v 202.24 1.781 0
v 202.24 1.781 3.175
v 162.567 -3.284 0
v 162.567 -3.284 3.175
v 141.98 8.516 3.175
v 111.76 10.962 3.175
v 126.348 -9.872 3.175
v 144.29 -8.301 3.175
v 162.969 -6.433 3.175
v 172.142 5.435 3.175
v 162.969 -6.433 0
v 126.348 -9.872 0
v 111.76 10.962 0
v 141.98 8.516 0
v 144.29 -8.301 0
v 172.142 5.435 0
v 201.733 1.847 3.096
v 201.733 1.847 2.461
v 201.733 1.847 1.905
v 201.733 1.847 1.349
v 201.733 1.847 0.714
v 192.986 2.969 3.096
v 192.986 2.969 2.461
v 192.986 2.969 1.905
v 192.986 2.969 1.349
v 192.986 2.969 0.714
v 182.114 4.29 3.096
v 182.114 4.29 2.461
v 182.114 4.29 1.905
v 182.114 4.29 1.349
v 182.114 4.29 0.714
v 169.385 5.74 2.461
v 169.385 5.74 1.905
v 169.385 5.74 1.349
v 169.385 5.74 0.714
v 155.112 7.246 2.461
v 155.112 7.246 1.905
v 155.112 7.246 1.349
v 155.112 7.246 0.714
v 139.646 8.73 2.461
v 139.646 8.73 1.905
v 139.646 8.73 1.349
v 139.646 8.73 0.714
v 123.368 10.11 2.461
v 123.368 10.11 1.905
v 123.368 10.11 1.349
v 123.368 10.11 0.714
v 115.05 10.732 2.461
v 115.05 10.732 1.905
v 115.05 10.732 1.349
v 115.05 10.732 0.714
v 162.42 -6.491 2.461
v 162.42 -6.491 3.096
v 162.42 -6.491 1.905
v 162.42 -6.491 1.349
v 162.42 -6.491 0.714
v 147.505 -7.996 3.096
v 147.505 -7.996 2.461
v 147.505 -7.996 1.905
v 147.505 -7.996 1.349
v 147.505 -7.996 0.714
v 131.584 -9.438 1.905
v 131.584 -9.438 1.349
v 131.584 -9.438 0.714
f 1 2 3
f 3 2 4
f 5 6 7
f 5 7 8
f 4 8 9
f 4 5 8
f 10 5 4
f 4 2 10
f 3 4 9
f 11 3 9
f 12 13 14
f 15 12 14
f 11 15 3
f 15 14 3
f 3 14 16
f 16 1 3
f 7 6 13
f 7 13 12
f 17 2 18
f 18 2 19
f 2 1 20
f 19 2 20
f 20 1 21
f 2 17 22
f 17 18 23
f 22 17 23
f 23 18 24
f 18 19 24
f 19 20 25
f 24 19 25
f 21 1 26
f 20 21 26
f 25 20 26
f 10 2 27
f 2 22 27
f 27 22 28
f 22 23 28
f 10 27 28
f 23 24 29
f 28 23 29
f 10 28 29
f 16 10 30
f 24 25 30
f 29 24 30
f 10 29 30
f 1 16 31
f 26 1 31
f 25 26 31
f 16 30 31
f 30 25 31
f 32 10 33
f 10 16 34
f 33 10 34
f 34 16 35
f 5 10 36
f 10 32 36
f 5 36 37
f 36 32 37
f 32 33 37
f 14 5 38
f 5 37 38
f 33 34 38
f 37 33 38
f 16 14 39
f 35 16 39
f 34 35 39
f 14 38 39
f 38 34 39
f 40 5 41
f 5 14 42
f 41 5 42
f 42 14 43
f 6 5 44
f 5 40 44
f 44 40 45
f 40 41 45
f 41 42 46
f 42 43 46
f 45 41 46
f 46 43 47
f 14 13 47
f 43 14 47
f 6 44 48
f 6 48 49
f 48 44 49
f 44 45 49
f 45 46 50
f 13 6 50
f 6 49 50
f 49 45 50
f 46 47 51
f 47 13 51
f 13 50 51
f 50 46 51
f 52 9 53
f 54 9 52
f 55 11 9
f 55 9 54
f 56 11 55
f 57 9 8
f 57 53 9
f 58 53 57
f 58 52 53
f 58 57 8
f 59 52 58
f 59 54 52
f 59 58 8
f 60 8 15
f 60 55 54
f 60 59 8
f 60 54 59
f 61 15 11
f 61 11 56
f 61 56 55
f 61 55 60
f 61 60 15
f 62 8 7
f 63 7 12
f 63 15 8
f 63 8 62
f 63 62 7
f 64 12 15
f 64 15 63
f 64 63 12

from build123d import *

# Parameters (mm, degrees)
BOSS_EXTRUDE1_DEPTH = 3.175
CUT_EXTRUDE1_DEPTH  = 5.08


with BuildPart() as part:
    # Sketch2 → Boss-Extrude1 (new body)
    with BuildSketch(Plane.XY):
        with BuildLine():
            add(Edge.make_bspline(
                [(213.36, 0), (213.257272793, 0.119144956), (212.930217359, 0.49847003), (211.784320833, 0.388103102), (210.220456583, 0.752231195), (207.922221089, 1.002358459), (205.040435451, 1.416814194), (201.53687476, 1.872417288), (197.453852985, 2.405608245), (192.809425036, 2.993232985), (187.634552437, 3.632300405), (181.96038472, 4.311820743), (175.822180186, 5.024095776), (169.257621951, 5.759205624), (162.307240439, 6.508241756), (155.013925984, 7.261881453), (147.42262952, 8.010402764), (139.580173762, 8.743297071), (131.534856191, 9.450943444), (123.336366748, 10.121511173), (115.035081585, 10.744066661), (106.682256297, 11.307051658), (98.329355975, 11.798694638), (90.027802971, 12.206574858), (81.828867412, 12.519815813), (73.782861936, 12.728198408), (65.939509207, 12.821544448), (58.347003411, 12.792445951), (51.052154229, 12.635282307), (44.099865123, 12.34606959), (37.532927606, 11.924051264), (31.391706263, 11.370497155), (25.713767757, 10.689730544), (20.533764615, 9.887543747), (15.882945038, 8.97231492), (11.789015751, 7.954392799), (8.273858988, 6.843703394), (5.359469774, 5.650591236), (3.043164975, 4.383128287), (1.36213983, 3.038812968), (0.222897845, 1.585123236), (0.070856618, 0.503892135), (0, 0)],
                knots=[0, 0, 0, 0, 0.002091853, 0.006659889, 0.014240034, 0.024784942, 0.038226646, 0.054481348, 0.073444809, 0.094998776, 0.11900639, 0.145318898, 0.173770288, 0.204183654, 0.236370679, 0.270129473, 0.305250351, 0.341516861, 0.378701149, 0.416575318, 0.454902219, 0.493447217, 0.531971459, 0.57023708, 0.608012632, 0.645066312, 0.681178002, 0.716129843, 0.74971807, 0.781748295, 0.812036536, 0.840415327, 0.866732056, 0.890849065, 0.912651845, 0.932046273, 0.94897292, 0.963413199, 0.975421325, 0.985175212, 0.993091122, 1, 1, 1, 1], degree=3))
            add(Edge.make_bspline(
                [(213.36, 0), (213.257272793, -0.119144956), (212.930217359, -0.49847003), (211.784320833, -0.388103102), (210.220456583, -0.752231195), (207.922221089, -1.002358459), (205.040435451, -1.416814194), (201.53687476, -1.872417288), (197.453852985, -2.405608245), (192.809425036, -2.993232985), (187.634552437, -3.632300405), (181.96038472, -4.311820743), (175.822180186, -5.024095776), (169.257621951, -5.759205624), (162.307240439, -6.508241756), (155.013925984, -7.261881453), (147.42262952, -8.010402764), (139.580173762, -8.743297071), (131.534856191, -9.450943444), (123.336366748, -10.121511173), (115.035081585, -10.744066661), (106.682256297, -11.307051658), (98.329355975, -11.798694638), (90.027802971, -12.206574858), (81.828867412, -12.519815813), (73.782861936, -12.728198408), (65.939509207, -12.821544448), (58.347003411, -12.792445951), (51.052154229, -12.635282307), (44.099865123, -12.34606959), (37.532927606, -11.924051264), (31.391706263, -11.370497155), (25.713767757, -10.689730544), (20.533764615, -9.887543747), (15.882945038, -8.97231492), (11.789015751, -7.954392799), (8.273858988, -6.843703394), (5.359469774, -5.650591236), (3.043164975, -4.383128287), (1.36213983, -3.038812968), (0.222897845, -1.585123236), (0.070856618, -0.503892135), (0, 0)],
                knots=[0, 0, 0, 0, 0.002091853, 0.006659889, 0.014240034, 0.024784942, 0.038226646, 0.054481348, 0.073444809, 0.094998776, 0.11900639, 0.145318898, 0.173770288, 0.204183654, 0.236370679, 0.270129473, 0.305250351, 0.341516861, 0.378701149, 0.416575318, 0.454902219, 0.493447217, 0.531971459, 0.57023708, 0.608012632, 0.645066312, 0.681178002, 0.716129843, 0.74971807, 0.781748295, 0.812036536, 0.840415327, 0.866732056, 0.890849065, 0.912651845, 0.932046273, 0.94897292, 0.963413199, 0.975421325, 0.985175212, 0.993091122, 1, 1, 1, 1], degree=3))
        make_face()
    extrude(amount=BOSS_EXTRUDE1_DEPTH)

    # Sketch3 → Cut-Extrude1 (cut)
    with BuildSketch(Plane.XY.offset(3.175)):
        Polygon((111.76, 10.961711107), (126.348178921, -9.872367542), (126.348178921, -50.8), (0, -50.8), (0, 0), (0, 50.8), (111.76, 50.8), align=None)
        Polygon((163.371025422, -9.582434223), (213.762062152, -3.149439796), (212.957937848, 3.149439796), (162.566901119, -3.283554632), align=None)
    extrude(amount=-CUT_EXTRUDE1_DEPTH, mode=Mode.SUBTRACT)


solid = part.part
